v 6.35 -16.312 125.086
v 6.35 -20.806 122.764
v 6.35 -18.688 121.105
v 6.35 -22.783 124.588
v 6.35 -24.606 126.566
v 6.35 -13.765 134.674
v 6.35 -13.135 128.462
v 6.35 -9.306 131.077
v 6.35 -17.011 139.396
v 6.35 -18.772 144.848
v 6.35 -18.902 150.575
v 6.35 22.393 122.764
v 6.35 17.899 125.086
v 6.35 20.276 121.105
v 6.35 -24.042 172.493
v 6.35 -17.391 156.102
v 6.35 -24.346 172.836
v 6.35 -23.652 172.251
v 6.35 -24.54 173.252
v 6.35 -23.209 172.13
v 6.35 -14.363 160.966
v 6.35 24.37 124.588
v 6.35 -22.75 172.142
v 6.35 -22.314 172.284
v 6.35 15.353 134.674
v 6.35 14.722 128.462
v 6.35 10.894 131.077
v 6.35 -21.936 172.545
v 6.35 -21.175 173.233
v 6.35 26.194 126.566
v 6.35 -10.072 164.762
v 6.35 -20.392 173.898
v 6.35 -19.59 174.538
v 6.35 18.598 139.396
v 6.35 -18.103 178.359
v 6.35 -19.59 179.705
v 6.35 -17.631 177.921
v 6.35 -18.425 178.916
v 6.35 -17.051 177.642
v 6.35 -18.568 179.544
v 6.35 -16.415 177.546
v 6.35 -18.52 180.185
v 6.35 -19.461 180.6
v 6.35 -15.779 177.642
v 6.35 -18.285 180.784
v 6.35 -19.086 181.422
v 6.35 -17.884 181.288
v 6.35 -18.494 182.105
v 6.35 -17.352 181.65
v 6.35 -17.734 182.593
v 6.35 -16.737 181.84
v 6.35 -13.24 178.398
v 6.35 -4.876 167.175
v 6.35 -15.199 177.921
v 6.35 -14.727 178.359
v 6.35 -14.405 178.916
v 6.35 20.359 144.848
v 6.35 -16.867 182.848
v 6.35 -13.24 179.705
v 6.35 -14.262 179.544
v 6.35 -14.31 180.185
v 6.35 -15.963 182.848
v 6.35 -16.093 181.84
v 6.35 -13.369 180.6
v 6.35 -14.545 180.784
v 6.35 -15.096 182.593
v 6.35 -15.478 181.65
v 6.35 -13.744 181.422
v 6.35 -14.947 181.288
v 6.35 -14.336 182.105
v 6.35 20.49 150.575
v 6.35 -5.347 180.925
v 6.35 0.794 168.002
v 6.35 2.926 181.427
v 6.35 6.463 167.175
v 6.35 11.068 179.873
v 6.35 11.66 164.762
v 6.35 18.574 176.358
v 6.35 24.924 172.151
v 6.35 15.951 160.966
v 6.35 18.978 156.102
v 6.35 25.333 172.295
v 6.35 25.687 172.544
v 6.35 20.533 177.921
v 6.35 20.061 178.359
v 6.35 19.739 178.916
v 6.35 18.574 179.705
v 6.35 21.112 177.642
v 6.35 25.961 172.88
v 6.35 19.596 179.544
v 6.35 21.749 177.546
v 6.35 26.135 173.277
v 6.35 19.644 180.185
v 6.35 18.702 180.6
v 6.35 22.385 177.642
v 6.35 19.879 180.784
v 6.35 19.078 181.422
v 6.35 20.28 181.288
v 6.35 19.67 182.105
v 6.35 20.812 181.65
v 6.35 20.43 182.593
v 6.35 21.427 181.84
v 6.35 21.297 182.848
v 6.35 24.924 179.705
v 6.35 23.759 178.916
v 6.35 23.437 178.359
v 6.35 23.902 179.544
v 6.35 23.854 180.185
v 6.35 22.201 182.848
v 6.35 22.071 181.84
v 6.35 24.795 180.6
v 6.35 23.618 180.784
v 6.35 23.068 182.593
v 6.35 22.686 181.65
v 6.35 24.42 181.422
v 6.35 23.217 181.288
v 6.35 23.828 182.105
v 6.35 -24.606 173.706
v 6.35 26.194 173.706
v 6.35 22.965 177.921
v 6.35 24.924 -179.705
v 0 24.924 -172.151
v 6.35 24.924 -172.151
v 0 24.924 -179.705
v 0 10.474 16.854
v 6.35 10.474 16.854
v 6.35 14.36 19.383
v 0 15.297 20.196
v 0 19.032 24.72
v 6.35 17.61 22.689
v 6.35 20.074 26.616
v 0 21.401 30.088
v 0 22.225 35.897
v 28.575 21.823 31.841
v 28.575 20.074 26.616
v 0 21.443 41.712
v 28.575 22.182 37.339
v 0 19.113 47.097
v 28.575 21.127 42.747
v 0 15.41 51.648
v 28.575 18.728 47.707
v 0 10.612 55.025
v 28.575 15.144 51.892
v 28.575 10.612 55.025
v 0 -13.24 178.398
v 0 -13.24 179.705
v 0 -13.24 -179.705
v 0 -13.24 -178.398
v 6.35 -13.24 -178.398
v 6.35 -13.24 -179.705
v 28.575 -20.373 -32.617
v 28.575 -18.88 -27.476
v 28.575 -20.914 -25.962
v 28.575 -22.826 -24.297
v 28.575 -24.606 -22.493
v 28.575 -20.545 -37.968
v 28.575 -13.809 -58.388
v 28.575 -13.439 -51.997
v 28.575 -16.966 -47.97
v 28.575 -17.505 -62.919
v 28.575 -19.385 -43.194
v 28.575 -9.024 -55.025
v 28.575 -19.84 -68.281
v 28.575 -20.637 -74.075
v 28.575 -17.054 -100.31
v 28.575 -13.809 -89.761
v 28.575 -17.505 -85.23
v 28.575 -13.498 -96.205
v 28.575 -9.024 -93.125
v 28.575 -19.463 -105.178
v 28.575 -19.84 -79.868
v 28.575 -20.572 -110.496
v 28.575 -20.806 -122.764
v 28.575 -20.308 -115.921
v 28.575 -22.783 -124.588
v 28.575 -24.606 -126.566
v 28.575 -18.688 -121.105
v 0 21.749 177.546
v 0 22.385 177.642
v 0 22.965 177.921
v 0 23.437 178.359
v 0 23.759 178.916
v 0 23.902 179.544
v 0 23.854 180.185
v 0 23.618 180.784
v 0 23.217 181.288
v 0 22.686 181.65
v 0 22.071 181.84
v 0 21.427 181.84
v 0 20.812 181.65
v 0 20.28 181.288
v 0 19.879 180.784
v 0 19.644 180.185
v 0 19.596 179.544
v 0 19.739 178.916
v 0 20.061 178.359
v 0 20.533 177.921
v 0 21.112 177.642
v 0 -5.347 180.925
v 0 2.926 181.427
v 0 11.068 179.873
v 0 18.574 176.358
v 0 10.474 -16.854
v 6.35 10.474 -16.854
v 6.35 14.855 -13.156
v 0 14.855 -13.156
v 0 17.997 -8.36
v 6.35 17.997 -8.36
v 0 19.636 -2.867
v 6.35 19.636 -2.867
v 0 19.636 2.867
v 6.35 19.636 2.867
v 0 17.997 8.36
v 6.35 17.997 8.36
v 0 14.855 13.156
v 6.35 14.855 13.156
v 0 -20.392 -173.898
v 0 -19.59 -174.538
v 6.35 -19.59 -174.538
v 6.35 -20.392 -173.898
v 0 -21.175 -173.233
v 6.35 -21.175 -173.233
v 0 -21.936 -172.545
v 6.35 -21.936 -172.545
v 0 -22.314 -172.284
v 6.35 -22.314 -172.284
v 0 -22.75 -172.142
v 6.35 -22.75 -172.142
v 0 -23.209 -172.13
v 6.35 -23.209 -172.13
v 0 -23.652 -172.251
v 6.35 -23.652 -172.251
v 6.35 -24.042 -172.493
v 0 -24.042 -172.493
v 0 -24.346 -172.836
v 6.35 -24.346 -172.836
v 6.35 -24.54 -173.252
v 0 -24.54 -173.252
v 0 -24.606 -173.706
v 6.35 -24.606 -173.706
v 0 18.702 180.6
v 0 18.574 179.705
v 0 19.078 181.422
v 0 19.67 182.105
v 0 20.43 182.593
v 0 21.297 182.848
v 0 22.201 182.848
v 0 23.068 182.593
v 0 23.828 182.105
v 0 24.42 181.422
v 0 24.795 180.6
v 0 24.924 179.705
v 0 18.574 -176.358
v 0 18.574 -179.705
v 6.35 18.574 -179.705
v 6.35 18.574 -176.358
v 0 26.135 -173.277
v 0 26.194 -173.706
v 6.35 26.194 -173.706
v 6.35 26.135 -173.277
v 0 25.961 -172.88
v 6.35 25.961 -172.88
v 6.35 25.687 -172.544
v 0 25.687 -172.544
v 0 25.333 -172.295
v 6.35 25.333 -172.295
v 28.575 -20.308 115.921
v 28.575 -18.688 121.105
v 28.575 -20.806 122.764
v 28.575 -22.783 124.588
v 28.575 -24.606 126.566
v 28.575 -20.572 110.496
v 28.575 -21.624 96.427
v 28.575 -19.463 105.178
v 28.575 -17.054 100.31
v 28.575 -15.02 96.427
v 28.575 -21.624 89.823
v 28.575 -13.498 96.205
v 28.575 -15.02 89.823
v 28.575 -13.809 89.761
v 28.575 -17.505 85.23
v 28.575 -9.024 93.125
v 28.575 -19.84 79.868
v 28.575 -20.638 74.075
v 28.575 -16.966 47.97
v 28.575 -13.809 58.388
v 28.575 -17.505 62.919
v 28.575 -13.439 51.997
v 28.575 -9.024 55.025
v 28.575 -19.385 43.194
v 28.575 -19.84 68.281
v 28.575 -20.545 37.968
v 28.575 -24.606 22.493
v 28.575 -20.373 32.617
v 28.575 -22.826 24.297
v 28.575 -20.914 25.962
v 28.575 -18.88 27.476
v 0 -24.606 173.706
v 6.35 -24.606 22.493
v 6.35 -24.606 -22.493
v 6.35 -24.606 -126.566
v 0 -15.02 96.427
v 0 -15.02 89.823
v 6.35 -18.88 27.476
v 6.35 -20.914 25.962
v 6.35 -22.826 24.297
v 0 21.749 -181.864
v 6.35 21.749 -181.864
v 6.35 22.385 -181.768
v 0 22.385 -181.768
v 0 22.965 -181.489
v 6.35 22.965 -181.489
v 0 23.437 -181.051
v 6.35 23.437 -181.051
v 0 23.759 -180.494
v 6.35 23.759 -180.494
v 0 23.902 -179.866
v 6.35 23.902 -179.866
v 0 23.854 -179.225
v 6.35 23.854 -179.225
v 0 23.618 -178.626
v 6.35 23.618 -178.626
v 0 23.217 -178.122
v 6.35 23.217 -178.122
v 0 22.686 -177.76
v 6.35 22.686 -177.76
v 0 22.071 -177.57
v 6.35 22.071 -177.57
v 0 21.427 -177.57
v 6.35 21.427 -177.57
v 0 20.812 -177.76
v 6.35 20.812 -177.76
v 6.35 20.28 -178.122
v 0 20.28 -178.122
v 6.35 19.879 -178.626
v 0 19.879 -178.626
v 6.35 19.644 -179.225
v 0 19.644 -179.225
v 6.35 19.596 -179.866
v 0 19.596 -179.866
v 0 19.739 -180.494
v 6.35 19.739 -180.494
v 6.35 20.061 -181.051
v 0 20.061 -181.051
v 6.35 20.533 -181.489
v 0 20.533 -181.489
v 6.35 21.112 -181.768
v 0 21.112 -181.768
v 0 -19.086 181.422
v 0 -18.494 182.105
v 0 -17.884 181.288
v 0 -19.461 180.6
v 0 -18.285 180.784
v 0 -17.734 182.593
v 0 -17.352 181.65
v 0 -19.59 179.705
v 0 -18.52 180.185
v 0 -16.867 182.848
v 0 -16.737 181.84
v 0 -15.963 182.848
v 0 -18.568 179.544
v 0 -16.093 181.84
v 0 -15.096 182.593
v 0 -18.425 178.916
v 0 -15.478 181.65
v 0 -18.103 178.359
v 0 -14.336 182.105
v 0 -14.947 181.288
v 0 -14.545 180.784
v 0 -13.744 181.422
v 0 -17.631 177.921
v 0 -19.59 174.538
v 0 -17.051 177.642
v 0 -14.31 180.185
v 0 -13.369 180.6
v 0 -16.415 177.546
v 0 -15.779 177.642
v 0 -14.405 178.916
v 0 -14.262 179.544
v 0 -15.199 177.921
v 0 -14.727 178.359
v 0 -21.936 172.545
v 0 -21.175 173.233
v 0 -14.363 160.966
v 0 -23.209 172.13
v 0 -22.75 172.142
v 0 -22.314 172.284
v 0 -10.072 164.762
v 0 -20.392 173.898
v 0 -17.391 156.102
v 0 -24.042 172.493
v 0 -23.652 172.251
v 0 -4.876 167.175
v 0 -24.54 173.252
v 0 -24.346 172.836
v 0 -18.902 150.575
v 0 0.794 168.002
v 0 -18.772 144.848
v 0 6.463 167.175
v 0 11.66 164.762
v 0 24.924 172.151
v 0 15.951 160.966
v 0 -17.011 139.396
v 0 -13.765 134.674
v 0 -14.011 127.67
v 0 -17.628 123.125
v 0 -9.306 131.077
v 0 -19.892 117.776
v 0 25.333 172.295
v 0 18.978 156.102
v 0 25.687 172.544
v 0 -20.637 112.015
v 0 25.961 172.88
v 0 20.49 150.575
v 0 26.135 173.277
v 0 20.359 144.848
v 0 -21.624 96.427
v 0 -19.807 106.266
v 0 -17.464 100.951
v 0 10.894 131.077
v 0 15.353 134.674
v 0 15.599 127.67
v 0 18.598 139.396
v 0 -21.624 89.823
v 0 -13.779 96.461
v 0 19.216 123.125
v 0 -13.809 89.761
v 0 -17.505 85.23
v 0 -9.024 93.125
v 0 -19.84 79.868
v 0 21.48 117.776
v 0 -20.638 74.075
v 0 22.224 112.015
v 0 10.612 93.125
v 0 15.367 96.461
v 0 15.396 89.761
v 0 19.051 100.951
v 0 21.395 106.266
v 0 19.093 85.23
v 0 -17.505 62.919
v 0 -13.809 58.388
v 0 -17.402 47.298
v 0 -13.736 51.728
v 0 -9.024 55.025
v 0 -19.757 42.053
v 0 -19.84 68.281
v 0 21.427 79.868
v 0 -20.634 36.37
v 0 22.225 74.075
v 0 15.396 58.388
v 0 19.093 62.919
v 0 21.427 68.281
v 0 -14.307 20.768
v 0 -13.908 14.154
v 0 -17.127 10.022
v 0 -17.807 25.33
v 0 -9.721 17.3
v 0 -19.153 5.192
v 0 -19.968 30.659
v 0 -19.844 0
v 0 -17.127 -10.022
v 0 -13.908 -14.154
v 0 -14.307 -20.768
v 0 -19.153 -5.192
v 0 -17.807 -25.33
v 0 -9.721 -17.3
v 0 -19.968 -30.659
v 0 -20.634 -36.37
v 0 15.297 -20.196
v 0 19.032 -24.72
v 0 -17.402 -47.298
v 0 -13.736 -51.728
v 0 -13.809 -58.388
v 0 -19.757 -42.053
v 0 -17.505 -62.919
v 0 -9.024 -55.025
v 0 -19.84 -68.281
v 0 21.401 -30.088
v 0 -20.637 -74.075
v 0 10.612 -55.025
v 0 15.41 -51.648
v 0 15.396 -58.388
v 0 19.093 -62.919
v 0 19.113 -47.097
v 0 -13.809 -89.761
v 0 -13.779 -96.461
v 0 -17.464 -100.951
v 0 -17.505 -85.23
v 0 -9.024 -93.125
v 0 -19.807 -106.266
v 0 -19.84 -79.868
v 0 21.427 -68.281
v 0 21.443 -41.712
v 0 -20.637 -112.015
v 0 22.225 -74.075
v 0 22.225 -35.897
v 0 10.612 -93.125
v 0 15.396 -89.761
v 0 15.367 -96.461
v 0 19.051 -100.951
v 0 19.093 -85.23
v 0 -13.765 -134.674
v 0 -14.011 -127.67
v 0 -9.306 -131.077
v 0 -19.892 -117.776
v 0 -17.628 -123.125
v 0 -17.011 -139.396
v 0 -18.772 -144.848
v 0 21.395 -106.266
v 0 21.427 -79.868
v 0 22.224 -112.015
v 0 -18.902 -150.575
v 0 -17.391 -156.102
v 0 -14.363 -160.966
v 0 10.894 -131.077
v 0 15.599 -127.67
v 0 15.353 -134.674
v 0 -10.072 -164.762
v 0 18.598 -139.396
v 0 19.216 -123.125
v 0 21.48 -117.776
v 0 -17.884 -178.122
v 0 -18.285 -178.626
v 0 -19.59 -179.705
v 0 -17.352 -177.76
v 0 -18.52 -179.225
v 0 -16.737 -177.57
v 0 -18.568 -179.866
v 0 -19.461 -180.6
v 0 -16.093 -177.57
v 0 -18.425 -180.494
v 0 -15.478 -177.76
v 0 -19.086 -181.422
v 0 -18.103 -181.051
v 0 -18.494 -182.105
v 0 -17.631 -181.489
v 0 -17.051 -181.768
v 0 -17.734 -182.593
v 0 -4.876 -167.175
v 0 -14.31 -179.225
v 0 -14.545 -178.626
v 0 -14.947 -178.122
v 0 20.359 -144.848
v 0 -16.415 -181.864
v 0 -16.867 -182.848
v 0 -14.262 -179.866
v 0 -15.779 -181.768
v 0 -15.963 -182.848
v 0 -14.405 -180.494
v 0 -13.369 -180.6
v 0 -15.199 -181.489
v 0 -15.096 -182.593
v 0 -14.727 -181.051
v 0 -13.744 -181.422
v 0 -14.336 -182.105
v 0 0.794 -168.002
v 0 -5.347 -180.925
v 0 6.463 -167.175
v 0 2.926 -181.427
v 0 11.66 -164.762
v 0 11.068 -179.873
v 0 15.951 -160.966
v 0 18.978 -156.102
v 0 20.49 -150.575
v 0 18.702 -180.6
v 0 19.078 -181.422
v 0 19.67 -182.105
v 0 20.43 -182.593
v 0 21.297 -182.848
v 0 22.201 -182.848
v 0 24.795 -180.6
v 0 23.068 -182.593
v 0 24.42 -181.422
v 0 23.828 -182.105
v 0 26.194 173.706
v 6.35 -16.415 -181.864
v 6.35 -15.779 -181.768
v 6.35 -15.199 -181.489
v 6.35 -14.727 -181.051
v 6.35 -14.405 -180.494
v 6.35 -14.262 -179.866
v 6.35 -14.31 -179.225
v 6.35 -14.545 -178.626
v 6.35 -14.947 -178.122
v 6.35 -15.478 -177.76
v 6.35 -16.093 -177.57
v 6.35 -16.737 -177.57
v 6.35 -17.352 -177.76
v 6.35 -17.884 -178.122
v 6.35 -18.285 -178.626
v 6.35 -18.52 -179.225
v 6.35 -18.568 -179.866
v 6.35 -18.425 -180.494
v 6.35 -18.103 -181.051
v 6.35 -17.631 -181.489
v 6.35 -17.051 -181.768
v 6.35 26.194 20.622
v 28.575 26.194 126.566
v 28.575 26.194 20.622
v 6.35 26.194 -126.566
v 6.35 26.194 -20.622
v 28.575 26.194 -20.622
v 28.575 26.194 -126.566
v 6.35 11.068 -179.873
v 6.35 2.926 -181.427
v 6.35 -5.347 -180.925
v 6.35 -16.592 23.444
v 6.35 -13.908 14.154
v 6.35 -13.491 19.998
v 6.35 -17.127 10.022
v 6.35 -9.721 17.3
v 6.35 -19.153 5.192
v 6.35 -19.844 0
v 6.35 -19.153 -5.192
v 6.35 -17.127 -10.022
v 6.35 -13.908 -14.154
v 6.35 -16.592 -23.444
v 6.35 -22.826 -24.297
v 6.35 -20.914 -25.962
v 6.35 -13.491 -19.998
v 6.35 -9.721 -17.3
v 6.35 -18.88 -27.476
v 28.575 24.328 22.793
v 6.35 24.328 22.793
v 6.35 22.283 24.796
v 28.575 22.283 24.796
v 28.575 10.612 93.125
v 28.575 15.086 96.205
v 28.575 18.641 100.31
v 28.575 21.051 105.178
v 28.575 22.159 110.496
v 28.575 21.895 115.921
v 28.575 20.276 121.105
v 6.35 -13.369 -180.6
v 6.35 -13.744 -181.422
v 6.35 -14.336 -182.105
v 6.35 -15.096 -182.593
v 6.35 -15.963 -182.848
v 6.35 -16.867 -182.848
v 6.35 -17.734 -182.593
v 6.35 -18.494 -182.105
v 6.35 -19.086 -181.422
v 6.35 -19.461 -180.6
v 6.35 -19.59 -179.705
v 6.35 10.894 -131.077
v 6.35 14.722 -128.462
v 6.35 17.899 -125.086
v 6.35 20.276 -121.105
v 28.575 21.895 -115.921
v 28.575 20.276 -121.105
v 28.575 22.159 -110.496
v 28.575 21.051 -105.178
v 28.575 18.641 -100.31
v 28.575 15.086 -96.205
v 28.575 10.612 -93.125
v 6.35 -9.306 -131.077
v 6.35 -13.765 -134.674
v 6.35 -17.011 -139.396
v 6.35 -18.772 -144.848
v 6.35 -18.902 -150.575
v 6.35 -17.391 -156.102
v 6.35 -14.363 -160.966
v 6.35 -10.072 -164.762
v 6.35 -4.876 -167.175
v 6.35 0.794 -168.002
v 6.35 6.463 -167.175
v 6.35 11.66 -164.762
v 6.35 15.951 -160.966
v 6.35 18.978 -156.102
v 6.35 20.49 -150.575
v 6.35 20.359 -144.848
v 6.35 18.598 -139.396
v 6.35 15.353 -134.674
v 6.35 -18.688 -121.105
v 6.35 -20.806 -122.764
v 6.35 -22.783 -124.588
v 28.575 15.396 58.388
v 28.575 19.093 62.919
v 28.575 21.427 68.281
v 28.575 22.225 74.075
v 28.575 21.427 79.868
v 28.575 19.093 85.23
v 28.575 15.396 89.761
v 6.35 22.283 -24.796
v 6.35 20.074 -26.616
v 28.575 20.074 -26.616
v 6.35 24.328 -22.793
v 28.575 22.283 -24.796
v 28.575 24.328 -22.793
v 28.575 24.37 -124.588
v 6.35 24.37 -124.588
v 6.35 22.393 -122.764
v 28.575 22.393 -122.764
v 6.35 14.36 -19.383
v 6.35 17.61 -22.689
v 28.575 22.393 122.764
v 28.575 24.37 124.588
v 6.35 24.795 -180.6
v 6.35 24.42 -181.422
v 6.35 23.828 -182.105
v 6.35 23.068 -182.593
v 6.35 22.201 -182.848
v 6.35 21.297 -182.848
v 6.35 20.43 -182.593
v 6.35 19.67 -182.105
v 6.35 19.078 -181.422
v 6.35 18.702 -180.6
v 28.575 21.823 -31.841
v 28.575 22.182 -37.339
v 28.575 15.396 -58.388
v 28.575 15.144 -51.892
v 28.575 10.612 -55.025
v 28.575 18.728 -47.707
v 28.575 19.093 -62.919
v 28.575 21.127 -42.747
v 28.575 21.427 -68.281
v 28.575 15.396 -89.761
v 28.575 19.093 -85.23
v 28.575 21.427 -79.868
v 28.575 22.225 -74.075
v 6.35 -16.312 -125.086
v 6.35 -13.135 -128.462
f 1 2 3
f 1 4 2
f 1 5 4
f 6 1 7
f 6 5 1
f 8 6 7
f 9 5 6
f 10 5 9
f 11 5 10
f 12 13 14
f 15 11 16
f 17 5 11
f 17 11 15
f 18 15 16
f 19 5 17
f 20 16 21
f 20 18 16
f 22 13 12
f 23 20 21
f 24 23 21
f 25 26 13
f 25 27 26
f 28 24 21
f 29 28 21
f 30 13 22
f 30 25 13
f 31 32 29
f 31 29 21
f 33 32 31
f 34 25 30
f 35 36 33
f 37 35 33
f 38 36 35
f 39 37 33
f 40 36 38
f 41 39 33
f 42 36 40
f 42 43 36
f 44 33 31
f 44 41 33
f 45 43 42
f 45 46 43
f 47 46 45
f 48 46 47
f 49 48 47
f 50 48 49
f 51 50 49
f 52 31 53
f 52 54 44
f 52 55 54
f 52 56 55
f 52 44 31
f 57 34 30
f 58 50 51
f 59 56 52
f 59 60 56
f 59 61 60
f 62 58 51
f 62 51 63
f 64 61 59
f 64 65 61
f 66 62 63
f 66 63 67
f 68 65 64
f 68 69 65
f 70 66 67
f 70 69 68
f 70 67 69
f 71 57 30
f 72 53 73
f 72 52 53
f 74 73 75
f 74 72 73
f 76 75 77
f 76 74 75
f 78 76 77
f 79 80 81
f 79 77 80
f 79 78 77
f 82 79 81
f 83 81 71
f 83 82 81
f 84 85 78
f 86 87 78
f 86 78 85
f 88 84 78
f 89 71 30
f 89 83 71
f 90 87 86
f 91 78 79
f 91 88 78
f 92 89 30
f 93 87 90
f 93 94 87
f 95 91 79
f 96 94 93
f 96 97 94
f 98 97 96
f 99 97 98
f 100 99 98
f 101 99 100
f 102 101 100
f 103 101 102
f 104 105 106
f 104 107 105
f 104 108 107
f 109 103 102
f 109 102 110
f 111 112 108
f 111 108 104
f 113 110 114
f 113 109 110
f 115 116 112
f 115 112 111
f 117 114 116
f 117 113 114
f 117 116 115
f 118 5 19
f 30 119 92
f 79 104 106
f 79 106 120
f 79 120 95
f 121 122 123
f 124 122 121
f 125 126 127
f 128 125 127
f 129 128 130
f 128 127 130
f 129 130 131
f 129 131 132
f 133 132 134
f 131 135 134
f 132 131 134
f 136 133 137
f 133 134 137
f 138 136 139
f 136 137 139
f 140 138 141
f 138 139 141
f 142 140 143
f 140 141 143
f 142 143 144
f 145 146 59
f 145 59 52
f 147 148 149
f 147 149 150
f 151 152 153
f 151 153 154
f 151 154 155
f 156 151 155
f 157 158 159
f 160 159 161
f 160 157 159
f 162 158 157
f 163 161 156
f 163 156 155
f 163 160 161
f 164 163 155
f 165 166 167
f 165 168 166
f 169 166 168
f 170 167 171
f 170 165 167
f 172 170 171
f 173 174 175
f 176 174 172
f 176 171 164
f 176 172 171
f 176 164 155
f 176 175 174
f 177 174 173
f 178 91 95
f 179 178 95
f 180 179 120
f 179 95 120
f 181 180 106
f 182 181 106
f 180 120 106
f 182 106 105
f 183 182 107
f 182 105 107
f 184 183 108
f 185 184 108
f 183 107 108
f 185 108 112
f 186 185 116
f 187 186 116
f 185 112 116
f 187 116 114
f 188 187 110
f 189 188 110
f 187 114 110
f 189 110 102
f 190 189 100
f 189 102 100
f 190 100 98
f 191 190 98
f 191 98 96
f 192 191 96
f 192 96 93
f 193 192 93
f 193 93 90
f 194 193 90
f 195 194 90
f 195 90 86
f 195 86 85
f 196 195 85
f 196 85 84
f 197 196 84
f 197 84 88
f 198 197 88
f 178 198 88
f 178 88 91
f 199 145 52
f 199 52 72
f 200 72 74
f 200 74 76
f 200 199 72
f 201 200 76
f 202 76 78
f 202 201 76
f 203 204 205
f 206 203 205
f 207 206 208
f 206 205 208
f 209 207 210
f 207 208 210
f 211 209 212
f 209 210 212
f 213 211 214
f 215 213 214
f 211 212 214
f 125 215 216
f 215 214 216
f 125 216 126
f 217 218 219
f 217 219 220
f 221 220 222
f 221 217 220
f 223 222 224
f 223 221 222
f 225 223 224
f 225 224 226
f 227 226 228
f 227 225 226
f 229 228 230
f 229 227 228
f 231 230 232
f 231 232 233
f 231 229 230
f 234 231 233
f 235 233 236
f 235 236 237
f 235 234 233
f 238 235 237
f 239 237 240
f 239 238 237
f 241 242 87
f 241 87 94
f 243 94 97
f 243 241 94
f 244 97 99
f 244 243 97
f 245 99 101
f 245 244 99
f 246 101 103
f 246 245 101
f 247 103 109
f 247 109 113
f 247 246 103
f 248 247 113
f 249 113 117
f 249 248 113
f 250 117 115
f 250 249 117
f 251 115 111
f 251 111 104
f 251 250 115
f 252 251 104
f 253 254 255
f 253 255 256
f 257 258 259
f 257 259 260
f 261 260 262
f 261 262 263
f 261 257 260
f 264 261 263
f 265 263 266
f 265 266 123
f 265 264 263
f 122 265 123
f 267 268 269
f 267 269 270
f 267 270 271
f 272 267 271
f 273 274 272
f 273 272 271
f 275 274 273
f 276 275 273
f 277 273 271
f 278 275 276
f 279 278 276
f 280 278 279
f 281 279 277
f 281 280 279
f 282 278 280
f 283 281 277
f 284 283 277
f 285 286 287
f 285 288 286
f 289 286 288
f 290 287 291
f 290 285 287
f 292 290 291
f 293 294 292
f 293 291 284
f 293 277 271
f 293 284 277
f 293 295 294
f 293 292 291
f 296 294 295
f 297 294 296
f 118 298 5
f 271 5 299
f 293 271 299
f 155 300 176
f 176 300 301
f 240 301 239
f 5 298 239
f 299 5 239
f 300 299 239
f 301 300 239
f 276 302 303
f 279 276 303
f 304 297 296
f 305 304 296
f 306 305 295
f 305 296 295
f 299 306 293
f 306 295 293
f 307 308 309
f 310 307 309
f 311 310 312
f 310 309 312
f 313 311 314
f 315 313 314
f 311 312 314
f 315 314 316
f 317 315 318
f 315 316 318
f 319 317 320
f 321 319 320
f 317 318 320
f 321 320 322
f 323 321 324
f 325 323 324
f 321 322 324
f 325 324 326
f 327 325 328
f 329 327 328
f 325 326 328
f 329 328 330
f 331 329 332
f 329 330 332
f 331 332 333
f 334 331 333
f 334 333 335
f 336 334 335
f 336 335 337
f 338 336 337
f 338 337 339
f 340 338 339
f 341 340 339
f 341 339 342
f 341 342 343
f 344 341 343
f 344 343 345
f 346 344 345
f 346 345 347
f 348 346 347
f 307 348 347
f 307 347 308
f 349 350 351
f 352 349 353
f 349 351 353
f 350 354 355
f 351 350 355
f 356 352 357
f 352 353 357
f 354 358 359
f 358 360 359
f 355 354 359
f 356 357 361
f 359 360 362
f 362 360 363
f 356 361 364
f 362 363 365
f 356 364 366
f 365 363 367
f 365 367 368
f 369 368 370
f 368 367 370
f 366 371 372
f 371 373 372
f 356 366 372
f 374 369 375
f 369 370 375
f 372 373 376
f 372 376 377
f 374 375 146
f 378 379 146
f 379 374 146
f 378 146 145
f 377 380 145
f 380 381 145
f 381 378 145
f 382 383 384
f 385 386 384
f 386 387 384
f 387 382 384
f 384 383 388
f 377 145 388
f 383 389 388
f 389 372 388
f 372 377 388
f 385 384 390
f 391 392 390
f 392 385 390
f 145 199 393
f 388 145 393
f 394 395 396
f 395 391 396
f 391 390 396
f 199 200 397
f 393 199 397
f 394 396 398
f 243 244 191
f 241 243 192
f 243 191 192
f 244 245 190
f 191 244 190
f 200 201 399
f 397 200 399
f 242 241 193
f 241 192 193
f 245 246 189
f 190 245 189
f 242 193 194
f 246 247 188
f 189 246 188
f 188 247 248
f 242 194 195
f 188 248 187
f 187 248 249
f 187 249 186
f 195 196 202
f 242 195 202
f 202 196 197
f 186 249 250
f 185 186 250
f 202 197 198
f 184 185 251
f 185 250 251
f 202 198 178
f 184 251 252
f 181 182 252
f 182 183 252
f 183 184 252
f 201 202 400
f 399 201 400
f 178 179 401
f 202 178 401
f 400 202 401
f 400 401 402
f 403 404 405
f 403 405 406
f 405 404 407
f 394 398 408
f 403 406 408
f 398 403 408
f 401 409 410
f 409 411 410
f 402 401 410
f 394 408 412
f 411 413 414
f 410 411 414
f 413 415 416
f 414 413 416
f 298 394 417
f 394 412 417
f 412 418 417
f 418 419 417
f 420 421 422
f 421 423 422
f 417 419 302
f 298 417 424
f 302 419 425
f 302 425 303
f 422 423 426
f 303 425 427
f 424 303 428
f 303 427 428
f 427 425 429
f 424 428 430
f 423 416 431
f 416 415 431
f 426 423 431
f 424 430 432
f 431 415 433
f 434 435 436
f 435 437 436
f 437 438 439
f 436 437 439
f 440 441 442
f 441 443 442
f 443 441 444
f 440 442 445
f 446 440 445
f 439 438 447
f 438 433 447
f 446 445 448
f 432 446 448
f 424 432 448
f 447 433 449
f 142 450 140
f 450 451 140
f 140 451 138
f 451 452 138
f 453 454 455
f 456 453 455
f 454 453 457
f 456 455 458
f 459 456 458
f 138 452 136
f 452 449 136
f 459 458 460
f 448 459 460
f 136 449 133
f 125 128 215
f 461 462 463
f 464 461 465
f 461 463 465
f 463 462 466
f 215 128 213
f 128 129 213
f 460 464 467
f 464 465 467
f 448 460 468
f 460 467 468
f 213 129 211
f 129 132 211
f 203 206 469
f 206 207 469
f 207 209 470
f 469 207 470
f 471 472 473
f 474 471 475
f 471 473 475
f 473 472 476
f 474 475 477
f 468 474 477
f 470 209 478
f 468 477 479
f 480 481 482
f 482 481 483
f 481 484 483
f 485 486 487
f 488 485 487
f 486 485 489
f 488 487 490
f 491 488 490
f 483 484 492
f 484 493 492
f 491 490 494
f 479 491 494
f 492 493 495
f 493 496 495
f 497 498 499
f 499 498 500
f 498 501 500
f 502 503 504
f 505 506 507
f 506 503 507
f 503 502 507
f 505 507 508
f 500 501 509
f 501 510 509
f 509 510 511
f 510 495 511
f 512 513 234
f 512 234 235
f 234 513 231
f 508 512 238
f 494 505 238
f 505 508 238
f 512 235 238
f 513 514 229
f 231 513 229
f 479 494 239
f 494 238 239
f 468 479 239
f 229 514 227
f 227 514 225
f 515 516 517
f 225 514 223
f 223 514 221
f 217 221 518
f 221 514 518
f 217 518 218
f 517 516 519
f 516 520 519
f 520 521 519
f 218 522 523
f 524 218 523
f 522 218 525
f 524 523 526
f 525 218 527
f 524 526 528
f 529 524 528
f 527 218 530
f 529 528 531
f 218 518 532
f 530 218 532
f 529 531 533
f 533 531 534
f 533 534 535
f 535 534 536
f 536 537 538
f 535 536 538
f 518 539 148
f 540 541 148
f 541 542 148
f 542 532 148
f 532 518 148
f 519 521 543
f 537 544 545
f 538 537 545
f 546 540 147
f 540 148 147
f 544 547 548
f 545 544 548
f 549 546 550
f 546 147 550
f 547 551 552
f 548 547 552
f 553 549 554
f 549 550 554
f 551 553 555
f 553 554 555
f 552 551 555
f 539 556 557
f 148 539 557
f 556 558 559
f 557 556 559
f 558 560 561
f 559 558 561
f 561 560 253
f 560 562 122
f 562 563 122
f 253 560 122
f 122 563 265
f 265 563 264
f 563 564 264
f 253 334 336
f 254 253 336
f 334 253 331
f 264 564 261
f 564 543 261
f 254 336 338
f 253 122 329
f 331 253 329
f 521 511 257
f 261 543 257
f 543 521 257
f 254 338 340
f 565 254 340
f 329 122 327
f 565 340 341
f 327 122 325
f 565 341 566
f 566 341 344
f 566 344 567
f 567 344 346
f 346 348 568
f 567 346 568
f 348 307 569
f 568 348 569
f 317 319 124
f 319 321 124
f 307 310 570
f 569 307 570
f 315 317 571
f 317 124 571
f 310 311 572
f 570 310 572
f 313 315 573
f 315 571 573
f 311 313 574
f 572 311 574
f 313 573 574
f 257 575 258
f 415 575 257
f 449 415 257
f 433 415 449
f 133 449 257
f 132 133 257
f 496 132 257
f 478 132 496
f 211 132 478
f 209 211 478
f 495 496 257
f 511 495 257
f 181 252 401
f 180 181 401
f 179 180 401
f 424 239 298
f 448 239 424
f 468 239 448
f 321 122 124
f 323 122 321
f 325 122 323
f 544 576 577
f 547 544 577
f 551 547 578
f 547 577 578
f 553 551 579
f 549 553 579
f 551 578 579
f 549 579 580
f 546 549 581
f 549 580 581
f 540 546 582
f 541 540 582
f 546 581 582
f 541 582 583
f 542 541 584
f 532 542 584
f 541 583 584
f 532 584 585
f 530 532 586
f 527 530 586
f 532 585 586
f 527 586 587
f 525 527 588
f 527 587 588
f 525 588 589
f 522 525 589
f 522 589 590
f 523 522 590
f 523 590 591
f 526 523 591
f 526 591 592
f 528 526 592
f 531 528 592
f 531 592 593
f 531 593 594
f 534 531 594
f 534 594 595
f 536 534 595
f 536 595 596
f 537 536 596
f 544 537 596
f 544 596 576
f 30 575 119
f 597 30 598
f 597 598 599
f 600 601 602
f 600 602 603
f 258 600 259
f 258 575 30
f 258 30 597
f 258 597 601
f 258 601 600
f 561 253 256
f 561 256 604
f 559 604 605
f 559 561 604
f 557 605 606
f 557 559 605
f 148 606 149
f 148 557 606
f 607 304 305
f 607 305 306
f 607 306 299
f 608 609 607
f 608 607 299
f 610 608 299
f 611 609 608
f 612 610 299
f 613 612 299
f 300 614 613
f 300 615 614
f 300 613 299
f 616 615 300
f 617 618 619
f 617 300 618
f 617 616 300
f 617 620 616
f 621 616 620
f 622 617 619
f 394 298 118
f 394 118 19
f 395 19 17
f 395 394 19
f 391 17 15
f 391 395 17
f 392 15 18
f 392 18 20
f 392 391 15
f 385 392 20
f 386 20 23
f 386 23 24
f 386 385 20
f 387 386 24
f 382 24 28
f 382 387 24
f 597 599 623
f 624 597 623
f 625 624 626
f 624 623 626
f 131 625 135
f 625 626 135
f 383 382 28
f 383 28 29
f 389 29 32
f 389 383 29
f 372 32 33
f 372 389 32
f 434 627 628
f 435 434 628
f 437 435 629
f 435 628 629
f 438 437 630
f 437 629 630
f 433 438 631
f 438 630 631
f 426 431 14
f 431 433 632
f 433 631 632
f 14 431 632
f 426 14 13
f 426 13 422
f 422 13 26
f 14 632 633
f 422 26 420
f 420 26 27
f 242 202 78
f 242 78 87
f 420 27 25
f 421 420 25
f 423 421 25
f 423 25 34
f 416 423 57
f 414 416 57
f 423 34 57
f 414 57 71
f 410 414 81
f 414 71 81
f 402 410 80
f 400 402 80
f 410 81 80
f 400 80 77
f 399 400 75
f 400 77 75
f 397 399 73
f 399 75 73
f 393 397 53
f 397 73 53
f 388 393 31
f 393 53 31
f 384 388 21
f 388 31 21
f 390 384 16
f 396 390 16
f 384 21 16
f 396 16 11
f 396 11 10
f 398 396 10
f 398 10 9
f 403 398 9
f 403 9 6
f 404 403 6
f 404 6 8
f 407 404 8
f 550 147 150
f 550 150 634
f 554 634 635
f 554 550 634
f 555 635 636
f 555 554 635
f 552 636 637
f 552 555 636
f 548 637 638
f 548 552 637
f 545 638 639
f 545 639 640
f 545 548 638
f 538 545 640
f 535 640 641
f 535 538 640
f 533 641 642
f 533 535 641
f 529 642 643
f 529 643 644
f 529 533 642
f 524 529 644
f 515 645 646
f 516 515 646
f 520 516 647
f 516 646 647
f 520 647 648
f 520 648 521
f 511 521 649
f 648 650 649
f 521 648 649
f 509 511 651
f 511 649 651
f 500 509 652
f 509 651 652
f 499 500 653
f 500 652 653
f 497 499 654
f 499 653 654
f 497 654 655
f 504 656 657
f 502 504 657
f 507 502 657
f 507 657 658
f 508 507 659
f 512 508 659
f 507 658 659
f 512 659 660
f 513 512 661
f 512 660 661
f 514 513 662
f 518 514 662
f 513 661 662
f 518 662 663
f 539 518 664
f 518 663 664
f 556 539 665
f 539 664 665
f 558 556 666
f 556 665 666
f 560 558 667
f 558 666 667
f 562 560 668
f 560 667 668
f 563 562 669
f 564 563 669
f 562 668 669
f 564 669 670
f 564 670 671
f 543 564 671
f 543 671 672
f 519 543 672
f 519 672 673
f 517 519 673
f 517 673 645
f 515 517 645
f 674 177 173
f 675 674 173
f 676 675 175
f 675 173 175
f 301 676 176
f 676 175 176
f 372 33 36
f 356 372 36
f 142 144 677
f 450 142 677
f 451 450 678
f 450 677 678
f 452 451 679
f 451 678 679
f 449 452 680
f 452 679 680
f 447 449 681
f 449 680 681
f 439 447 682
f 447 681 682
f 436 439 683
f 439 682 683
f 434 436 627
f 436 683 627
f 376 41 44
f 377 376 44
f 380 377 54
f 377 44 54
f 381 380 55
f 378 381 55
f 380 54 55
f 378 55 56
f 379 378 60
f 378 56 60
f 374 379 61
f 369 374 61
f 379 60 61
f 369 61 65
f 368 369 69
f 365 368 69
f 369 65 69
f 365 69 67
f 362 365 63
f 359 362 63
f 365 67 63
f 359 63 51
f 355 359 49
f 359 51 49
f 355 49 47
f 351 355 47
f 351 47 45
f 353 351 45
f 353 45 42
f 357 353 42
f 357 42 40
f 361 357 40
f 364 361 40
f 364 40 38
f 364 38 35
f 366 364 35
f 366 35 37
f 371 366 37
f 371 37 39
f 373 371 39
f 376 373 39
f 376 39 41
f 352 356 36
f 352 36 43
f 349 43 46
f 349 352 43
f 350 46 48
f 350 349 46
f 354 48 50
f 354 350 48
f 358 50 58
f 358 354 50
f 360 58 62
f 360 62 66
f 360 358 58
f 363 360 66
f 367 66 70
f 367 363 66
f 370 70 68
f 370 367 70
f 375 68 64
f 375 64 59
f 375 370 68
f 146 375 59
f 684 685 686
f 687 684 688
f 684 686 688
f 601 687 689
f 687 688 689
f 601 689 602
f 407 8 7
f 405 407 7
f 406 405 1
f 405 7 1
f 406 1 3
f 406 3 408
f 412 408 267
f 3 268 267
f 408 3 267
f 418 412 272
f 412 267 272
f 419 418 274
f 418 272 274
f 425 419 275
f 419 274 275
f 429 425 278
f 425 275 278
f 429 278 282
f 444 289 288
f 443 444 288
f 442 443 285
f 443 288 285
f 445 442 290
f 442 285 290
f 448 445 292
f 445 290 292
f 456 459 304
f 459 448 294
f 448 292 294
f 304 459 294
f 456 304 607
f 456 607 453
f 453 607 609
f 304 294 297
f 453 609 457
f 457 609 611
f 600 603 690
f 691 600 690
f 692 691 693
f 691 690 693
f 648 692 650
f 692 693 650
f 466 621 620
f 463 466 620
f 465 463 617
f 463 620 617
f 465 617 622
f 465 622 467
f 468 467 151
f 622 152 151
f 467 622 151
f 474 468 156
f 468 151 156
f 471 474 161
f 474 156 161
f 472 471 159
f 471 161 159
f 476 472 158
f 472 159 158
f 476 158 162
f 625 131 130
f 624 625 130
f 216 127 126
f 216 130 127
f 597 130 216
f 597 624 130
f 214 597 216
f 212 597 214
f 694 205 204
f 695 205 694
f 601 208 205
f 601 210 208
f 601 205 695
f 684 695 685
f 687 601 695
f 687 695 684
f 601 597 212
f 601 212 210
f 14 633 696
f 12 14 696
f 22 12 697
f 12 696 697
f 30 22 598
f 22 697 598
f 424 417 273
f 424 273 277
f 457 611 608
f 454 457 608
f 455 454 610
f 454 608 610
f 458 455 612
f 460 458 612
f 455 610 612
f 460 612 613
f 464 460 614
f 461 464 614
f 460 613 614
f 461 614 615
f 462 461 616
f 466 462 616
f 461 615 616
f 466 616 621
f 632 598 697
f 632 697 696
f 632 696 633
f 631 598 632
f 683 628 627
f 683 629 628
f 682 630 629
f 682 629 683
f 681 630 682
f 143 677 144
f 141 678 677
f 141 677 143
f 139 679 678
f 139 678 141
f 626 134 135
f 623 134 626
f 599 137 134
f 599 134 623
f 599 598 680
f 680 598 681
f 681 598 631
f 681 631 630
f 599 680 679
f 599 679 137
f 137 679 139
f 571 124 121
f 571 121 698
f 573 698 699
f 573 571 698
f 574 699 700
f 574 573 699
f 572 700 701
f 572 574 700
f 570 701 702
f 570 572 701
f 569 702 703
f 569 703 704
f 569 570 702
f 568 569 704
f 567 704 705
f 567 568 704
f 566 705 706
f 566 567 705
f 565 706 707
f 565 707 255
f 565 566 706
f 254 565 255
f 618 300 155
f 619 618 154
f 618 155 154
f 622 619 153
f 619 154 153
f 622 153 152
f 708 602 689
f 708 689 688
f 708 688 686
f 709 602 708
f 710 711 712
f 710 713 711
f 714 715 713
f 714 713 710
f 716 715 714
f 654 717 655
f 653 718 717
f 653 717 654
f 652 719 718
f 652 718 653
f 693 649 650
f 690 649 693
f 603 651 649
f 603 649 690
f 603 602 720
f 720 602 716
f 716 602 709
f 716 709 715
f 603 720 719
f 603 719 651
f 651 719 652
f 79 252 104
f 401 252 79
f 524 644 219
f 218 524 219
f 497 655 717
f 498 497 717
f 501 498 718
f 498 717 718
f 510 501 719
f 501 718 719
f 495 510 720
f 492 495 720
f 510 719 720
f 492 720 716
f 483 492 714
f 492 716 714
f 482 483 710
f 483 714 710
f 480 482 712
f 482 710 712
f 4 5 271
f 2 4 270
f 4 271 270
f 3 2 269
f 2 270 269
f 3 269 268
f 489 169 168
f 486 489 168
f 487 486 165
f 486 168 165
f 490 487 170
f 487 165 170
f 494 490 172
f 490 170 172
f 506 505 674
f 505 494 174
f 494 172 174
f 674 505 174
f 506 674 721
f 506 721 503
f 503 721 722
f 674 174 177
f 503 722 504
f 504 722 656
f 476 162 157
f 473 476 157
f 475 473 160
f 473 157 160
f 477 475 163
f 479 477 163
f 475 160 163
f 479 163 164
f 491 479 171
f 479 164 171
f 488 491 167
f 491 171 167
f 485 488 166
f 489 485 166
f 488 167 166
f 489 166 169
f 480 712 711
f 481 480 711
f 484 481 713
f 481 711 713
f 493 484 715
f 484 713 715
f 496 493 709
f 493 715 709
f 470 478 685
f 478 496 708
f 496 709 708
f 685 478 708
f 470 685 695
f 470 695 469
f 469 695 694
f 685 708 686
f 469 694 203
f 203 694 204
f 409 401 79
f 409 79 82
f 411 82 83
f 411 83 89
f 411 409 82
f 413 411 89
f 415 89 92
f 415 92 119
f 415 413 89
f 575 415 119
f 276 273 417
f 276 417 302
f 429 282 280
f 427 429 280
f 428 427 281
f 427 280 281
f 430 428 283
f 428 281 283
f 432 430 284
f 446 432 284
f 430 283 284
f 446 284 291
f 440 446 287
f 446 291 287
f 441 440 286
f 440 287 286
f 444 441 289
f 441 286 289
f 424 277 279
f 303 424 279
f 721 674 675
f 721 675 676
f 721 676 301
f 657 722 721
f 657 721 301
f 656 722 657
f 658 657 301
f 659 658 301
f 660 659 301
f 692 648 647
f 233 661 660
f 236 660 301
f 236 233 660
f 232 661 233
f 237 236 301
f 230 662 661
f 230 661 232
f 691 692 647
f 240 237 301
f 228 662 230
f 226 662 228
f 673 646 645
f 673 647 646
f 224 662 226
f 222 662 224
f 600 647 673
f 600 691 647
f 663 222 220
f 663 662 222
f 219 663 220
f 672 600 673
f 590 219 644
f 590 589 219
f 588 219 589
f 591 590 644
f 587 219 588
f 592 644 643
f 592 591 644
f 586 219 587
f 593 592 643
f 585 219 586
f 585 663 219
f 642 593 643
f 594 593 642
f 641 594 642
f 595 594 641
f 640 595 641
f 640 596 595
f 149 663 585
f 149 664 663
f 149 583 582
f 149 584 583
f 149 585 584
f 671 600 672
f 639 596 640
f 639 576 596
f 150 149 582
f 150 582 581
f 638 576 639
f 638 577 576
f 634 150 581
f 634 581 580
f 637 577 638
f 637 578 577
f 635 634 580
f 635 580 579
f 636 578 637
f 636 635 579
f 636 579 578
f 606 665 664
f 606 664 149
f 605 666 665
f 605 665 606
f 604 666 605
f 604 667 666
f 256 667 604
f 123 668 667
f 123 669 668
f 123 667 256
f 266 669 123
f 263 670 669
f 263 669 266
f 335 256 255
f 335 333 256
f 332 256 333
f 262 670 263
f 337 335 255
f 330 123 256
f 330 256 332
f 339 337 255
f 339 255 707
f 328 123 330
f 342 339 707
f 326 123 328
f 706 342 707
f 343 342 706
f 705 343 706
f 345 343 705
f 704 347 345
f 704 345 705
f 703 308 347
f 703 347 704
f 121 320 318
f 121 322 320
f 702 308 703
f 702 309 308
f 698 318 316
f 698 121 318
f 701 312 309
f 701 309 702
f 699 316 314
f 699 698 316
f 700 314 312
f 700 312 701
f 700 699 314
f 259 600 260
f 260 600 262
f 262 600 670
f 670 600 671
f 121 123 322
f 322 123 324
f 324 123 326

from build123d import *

# Parameters (mm, degrees)
SKETCH1_W           = 368.3
SKETCH1_H           = 50.8
BOSS_EXTRUDE1_DEPTH = 28.575
CHAMFER1_SIZE       = 6.35
FILLET1_R           = 3.175
SKETCH2_R           = 33.3375
CUT_EXTRUDE1_DEPTH  = 22.225
CUT_EXTRUDE2_REACH  = 190.186
CUT_EXTRUDE3_REACH  = 190.186
SKETCH5_W           = 6.604
SKETCH5_H           = 6.604
FILLET2_R           = 1.5875
CAVITY1_START       = 6.35
CAVITY1_OUTLINE_R   = 1.905
CAVITY1_DEPTH       = 22.225
CAVITY1_2_DEPTH     = 6.35
CUT_EXTRUDE4_REACH  = 188.943
SKETCH7_R           = 2.159


# Read off the part's stored shape, not the designer's step: Cavity1
with BuildPart() as part:
    # Sketch1 → Boss-Extrude1 (new body)
    with BuildSketch(Plane(origin=(0, 0, 0), x_dir=(0, 0, -1), z_dir=(1, 0, 0))):
        with Locations((0, 0.79375)):
            Rectangle(SKETCH1_W, SKETCH1_H)
    extrude(amount=BOSS_EXTRUDE1_DEPTH)

    # Chamfer1
    chamfer1_edges = [part.edges().sort_by_distance(p)[0] for p in [
        (14.2875, -24.60625, 184.15),
        (14.2875, -24.60625, -184.15),
    ]]
    chamfer(chamfer1_edges, length=CHAMFER1_SIZE)

    # Fillet1
    fillet1_edges = [part.edges().sort_by_distance(p)[0] for p in [
        (14.2875, -18.25625, -184.15),
        (14.2875, -24.60625, 177.8),
        (14.2875, -24.60625, -177.8),
        (14.2875, -18.25625, 184.15),
        (14.2875, 26.19375, 184.15),
        (14.2875, 26.19375, -184.15),
    ]]
    fillet(fillet1_edges, radius=FILLET1_R)

    # Sketch2 → Cut-Extrude1 (cut)
    with BuildSketch(Plane(origin=(28.575, 0, 0), x_dir=(0, 0, -1), z_dir=(1, 0, 0))):
        with Locations((-148.157911006, 0.79375)):
            Circle(SKETCH2_R)
        Circle(SKETCH2_R)
        with Locations((148.157911006, 0.79375)):
            Circle(SKETCH2_R)
    extrude(amount=-CUT_EXTRUDE1_DEPTH, mode=Mode.SUBTRACT)

    # Sketch4 → Cut-Extrude2 (cut, up to next)
    with BuildSketch(Plane(origin=(28.575, 0, 0), x_dir=(0, 0, -1), z_dir=(1, 0, 0)), mode=Mode.PRIVATE) as cut_extrude2_sk1:
        with BuildLine():
            ThreePointArc((-131.07672228, 10.893621573), (-168.001661006, 0.79375), (-131.07672228, -9.306121573))
            ThreePointArc((-131.07672228, -9.306121573), (-112.015493633, -20.636909552), (-93.124577673, -9.024395271))
            ThreePointArc((-93.124577673, -9.024395271), (-74.074577673, -20.6375), (-55.024577673, -9.024395271))
            ThreePointArc((-55.024577673, -9.024395271), (-36.370033983, -20.633851146), (-17.299823722, -9.720623089))
            ThreePointArc((-17.299823722, -9.720623089), (0, -19.84375), (17.299823722, -9.720623089))
            ThreePointArc((17.299823722, -9.720623089), (36.370033983, -20.633851146), (55.024577673, -9.024395271))
            ThreePointArc((55.024577673, -9.024395271), (74.074577673, -20.6375), (93.124577673, -9.024395271))
            ThreePointArc((93.124577673, -9.024395271), (112.015493633, -20.636909552), (131.07672228, -9.306121573))
            ThreePointArc((131.07672228, -9.306121573), (168.001661006, 0.79375), (131.07672228, 10.893621573))
            ThreePointArc((131.07672228, 10.893621573), (112.015493633, 22.224409552), (93.124577673, 10.611895271))
            ThreePointArc((93.124577673, 10.611895271), (74.074577673, 22.225), (55.024577673, 10.611895271))
            ThreePointArc((55.024577673, 10.611895271), (35.897270086, 22.224860566), (16.854241153, 10.474204945))
            ThreePointArc((16.854241153, 10.474204945), (0, 19.84375), (-16.854241153, 10.474204945))
            ThreePointArc((-16.854241153, 10.474204945), (-35.897270086, 22.224860566), (-55.024577673, 10.611895271))
            ThreePointArc((-55.024577673, 10.611895271), (-74.074577673, 22.225), (-93.124577673, 10.611895271))
            ThreePointArc((-93.124577673, 10.611895271), (-112.015493633, 22.224409552), (-131.07672228, 10.893621573))
        make_face()
    cut_extrude2_tool1 = extrude(cut_extrude2_sk1.sketch, amount=-CUT_EXTRUDE2_REACH, mode=Mode.PRIVATE) & part.part
    add(cut_extrude2_tool1.solids().sort_by_distance((28.575, 0.715797, 0))[0], mode=Mode.SUBTRACT)

    # Sketch5 → Cut-Extrude3 (cut, up to next)
    with BuildSketch(Plane(origin=(28.575, 0, 0), x_dir=(0, 0, -1), z_dir=(1, 0, 0)), mode=Mode.PRIVATE) as cut_extrude3_sk1:
        with Locations((-93.124577673, -18.322281394)):
            Rectangle(SKETCH5_W, SKETCH5_H)
    cut_extrude3_tool1 = extrude(cut_extrude3_sk1.sketch, amount=-CUT_EXTRUDE3_REACH, mode=Mode.PRIVATE) & part.part
    add(cut_extrude3_tool1.solids().sort_by_distance((28.575, -18.322281, 93.124578))[0], mode=Mode.SUBTRACT)

    # Fillet2
    fillet2_edges = [part.edges().sort_by_distance(p)[0] for p in [
        (17.4625, -24.60625, -169.750245438),
        (17.4625, 26.19375, -169.750245438),
        (17.4625, -24.60625, 169.750245438),
        (17.4625, 26.19375, 169.750245438),
    ]]
    fillet(fillet2_edges, radius=FILLET2_R)

    # Cavity1 outline → Cavity1 (cut)
    # profile 1 of 2: a face of its own
    with BuildSketch(Plane.YZ.offset(CAVITY1_START)):
        with BuildLine():
            ThreePointArc((-21.936363636, 172.545014982), (-20.786227921, 173.568410001), (-19.590070715, 174.537614554))
            ThreePointArc((-19.590070715, 174.537614554), (-16.522960019, 176.64510919), (-13.240070715, 178.397632936))
            ThreePointArc((-13.240070715, 178.397632936), (2.926403377, 181.427126443), (18.57375, 176.358274589))
            ThreePointArc((18.57375, 176.358274589), (21.138345447, 174.567877729), (23.523863636, 172.545014982))
            ThreePointArc((23.523863636, 172.545014982), (24.176019306, 172.178216056), (24.92375, 172.150879661))
            ThreePointArc((24.92375, 172.150879661), (25.835922212, 172.70228249), (26.19375, 173.706305647))
            Line((26.19375, 173.706305647), (26.19375, 180.975))
            ThreePointArc((26.19375, 180.975), (25.26381403, 183.22006403), (23.01875, 184.15))
            Line((23.01875, 184.15), (-16.941121939, 184.15))
            ThreePointArc((-16.941121939, 184.15), (-18.156141837, 183.908317516), (-19.18618597, 183.22006403))
            Line((-19.18618597, 183.22006403), (-23.67631403, 178.72993597))
            ThreePointArc((-23.67631403, 178.72993597), (-24.364567516, 177.699891837), (-24.60625, 176.484871939))
            Line((-24.60625, 176.484871939), (-24.60625, 173.706305647))
            ThreePointArc((-24.60625, 173.706305647), (-23.651943453, 172.250550757), (-21.936363636, 172.545014982))
        make_face()
        with Locations((-16.415070715, 179.705)):
            Circle(CAVITY1_OUTLINE_R, mode=Mode.SUBTRACT)
        with Locations((21.74875, 179.705)):
            Circle(CAVITY1_OUTLINE_R, mode=Mode.SUBTRACT)
    # profile 2 of 2: a face of its own
    with BuildSketch(Plane.YZ.offset(CAVITY1_START)):
        with BuildLine():
            ThreePointArc((-21.936363636, -172.545014982), (-23.651943453, -172.250550757), (-24.60625, -173.706305647))
            Line((-24.60625, -173.706305647), (-24.60625, -176.484871939))
            ThreePointArc((-24.60625, -176.484871939), (-24.364567516, -177.699891837), (-23.67631403, -178.72993597))
            Line((-23.67631403, -178.72993597), (-19.18618597, -183.22006403))
            ThreePointArc((-19.18618597, -183.22006403), (-18.156141837, -183.908317516), (-16.941121939, -184.15))
            Line((-16.941121939, -184.15), (23.01875, -184.15))
            ThreePointArc((23.01875, -184.15), (25.26381403, -183.22006403), (26.19375, -180.975))
            Line((26.19375, -180.975), (26.19375, -173.706305647))
            ThreePointArc((26.19375, -173.706305647), (25.835922212, -172.70228249), (24.92375, -172.150879661))
            ThreePointArc((24.92375, -172.150879661), (24.176019306, -172.178216056), (23.523863636, -172.545014982))
            ThreePointArc((23.523863636, -172.545014982), (21.138345447, -174.567877729), (18.57375, -176.358274589))
            ThreePointArc((18.57375, -176.358274589), (2.926403377, -181.427126443), (-13.240070715, -178.397632935))
            ThreePointArc((-13.240070715, -178.397632935), (-16.522960019, -176.64510919), (-19.590070715, -174.537614554))
            ThreePointArc((-19.590070715, -174.537614554), (-20.786227921, -173.568410001), (-21.936363636, -172.545014982))
        make_face()
        with Locations((-16.415070715, -179.705)):
            Circle(CAVITY1_OUTLINE_R, mode=Mode.SUBTRACT)
        with Locations((21.74875, -179.705)):
            Circle(CAVITY1_OUTLINE_R, mode=Mode.SUBTRACT)
    extrude(amount=CAVITY1_DEPTH, mode=Mode.SUBTRACT)

    # Cavity1 2 outline → Cavity1 2 (cut)
    with BuildSketch(Plane.YZ):
        with BuildLine():
            Line((-13.240070715, 179.705), (-13.240070715, 178.397632935))
            ThreePointArc((-13.240070715, 178.397632935), (2.926403377, 181.427126443), (18.57375, 176.358274589))
            Line((18.57375, 176.358274589), (18.57375, 179.705))
            ThreePointArc((18.57375, 179.705), (21.74875, 182.88), (24.92375, 179.705))
            Line((24.92375, 179.705), (24.92375, 172.150879661))
            ThreePointArc((24.92375, 172.150879661), (25.835922212, 172.70228249), (26.19375, 173.706305647))
            Line((26.19375, 173.706305647), (26.19375, 180.975))
            ThreePointArc((26.19375, 180.975), (25.26381403, 183.22006403), (23.01875, 184.15))
            Line((23.01875, 184.15), (-16.941121939, 184.15))
            ThreePointArc((-16.941121939, 184.15), (-18.156141837, 183.908317516), (-19.18618597, 183.22006403))
            Line((-19.18618597, 183.22006403), (-23.67631403, 178.72993597))
            ThreePointArc((-23.67631403, 178.72993597), (-24.364567516, 177.699891837), (-24.60625, 176.484871939))
            Line((-24.60625, 176.484871939), (-24.60625, 173.706305647))
            ThreePointArc((-24.60625, 173.706305647), (-23.651943453, 172.250550757), (-21.936363636, 172.545014982))
            ThreePointArc((-21.936363636, 172.545014982), (-20.786227921, 173.568410001), (-19.590070715, 174.537614554))
            Line((-19.590070715, 174.537614554), (-19.590070715, 179.705))
            ThreePointArc((-19.590070715, 179.705), (-16.415070715, 182.88), (-13.240070715, 179.705))
        make_face()
        with BuildLine():
            ThreePointArc((-21.936363636, -172.545014982), (-23.651943453, -172.250550757), (-24.60625, -173.706305647))
            Line((-24.60625, -173.706305647), (-24.60625, -176.484871939))
            ThreePointArc((-24.60625, -176.484871939), (-24.364567516, -177.699891837), (-23.67631403, -178.72993597))
            Line((-23.67631403, -178.72993597), (-19.18618597, -183.22006403))
            ThreePointArc((-19.18618597, -183.22006403), (-18.156141837, -183.908317516), (-16.941121939, -184.15))
            Line((-16.941121939, -184.15), (23.01875, -184.15))
            ThreePointArc((23.01875, -184.15), (25.26381403, -183.22006403), (26.19375, -180.975))
            Line((26.19375, -180.975), (26.19375, -173.706305647))
            ThreePointArc((26.19375, -173.706305647), (25.835922212, -172.70228249), (24.92375, -172.150879661))
            Line((24.92375, -172.150879661), (24.92375, -179.705))
            ThreePointArc((24.92375, -179.705), (21.74875, -182.88), (18.57375, -179.705))
            Line((18.57375, -179.705), (18.57375, -176.358274589))
            ThreePointArc((18.57375, -176.358274589), (2.926403377, -181.427126443), (-13.240070715, -178.397632935))
            Line((-13.240070715, -178.397632935), (-13.240070715, -179.705))
            ThreePointArc((-13.240070715, -179.705), (-16.415070715, -182.88), (-19.590070715, -179.705))
            Line((-19.590070715, -179.705), (-19.590070715, -174.537614554))
            ThreePointArc((-19.590070715, -174.537614554), (-20.786227921, -173.568410001), (-21.936363636, -172.545014982))
        make_face()
    extrude(amount=CAVITY1_2_DEPTH, mode=Mode.SUBTRACT)

    # Sketch7 → Cut-Extrude4 (cut, up to next)
    with BuildSketch(Plane(origin=(28.575, 0, 0), x_dir=(0, 0, -1), z_dir=(1, 0, 0)), mode=Mode.PRIVATE) as cut_extrude4_sk1:
        with Locations((-179.705, 21.74875)):
            Circle(SKETCH7_R)
    cut_extrude4_tool1 = extrude(cut_extrude4_sk1.sketch, amount=-CUT_EXTRUDE4_REACH, mode=Mode.PRIVATE) & part.part
    # Sketch7 → Cut-Extrude4 (cut, up to next)
    with BuildSketch(Plane(origin=(28.575, 0, 0), x_dir=(0, 0, -1), z_dir=(1, 0, 0)), mode=Mode.PRIVATE) as cut_extrude4_sk2:
        with Locations((-179.705, -16.415070715)):
            Circle(SKETCH7_R)
    cut_extrude4_tool2 = extrude(cut_extrude4_sk2.sketch, amount=-CUT_EXTRUDE4_REACH, mode=Mode.PRIVATE) & part.part
    # Sketch7 → Cut-Extrude4 (cut, up to next)
    with BuildSketch(Plane(origin=(28.575, 0, 0), x_dir=(0, 0, -1), z_dir=(1, 0, 0)), mode=Mode.PRIVATE) as cut_extrude4_sk3:
        with Locations((179.705, 21.74875)):
            Circle(SKETCH7_R)
    cut_extrude4_tool3 = extrude(cut_extrude4_sk3.sketch, amount=-CUT_EXTRUDE4_REACH, mode=Mode.PRIVATE) & part.part
    # Sketch7 → Cut-Extrude4 (cut, up to next)
    with BuildSketch(Plane(origin=(28.575, 0, 0), x_dir=(0, 0, -1), z_dir=(1, 0, 0)), mode=Mode.PRIVATE) as cut_extrude4_sk4:
        with Locations((179.705, -16.415070715)):
            Circle(SKETCH7_R)
    cut_extrude4_tool4 = extrude(cut_extrude4_sk4.sketch, amount=-CUT_EXTRUDE4_REACH, mode=Mode.PRIVATE) & part.part
    add(cut_extrude4_tool1.solids().sort_by_distance((28.575, 21.74875, 179.705))[0], mode=Mode.SUBTRACT)
    add(cut_extrude4_tool2.solids().sort_by_distance((28.575, -16.415071, 179.705))[0], mode=Mode.SUBTRACT)
    add(cut_extrude4_tool3.solids().sort_by_distance((28.575, 21.74875, -179.705))[0], mode=Mode.SUBTRACT)
    add(cut_extrude4_tool4.solids().sort_by_distance((28.575, -16.415071, -179.705))[0], mode=Mode.SUBTRACT)


solid = part.part
